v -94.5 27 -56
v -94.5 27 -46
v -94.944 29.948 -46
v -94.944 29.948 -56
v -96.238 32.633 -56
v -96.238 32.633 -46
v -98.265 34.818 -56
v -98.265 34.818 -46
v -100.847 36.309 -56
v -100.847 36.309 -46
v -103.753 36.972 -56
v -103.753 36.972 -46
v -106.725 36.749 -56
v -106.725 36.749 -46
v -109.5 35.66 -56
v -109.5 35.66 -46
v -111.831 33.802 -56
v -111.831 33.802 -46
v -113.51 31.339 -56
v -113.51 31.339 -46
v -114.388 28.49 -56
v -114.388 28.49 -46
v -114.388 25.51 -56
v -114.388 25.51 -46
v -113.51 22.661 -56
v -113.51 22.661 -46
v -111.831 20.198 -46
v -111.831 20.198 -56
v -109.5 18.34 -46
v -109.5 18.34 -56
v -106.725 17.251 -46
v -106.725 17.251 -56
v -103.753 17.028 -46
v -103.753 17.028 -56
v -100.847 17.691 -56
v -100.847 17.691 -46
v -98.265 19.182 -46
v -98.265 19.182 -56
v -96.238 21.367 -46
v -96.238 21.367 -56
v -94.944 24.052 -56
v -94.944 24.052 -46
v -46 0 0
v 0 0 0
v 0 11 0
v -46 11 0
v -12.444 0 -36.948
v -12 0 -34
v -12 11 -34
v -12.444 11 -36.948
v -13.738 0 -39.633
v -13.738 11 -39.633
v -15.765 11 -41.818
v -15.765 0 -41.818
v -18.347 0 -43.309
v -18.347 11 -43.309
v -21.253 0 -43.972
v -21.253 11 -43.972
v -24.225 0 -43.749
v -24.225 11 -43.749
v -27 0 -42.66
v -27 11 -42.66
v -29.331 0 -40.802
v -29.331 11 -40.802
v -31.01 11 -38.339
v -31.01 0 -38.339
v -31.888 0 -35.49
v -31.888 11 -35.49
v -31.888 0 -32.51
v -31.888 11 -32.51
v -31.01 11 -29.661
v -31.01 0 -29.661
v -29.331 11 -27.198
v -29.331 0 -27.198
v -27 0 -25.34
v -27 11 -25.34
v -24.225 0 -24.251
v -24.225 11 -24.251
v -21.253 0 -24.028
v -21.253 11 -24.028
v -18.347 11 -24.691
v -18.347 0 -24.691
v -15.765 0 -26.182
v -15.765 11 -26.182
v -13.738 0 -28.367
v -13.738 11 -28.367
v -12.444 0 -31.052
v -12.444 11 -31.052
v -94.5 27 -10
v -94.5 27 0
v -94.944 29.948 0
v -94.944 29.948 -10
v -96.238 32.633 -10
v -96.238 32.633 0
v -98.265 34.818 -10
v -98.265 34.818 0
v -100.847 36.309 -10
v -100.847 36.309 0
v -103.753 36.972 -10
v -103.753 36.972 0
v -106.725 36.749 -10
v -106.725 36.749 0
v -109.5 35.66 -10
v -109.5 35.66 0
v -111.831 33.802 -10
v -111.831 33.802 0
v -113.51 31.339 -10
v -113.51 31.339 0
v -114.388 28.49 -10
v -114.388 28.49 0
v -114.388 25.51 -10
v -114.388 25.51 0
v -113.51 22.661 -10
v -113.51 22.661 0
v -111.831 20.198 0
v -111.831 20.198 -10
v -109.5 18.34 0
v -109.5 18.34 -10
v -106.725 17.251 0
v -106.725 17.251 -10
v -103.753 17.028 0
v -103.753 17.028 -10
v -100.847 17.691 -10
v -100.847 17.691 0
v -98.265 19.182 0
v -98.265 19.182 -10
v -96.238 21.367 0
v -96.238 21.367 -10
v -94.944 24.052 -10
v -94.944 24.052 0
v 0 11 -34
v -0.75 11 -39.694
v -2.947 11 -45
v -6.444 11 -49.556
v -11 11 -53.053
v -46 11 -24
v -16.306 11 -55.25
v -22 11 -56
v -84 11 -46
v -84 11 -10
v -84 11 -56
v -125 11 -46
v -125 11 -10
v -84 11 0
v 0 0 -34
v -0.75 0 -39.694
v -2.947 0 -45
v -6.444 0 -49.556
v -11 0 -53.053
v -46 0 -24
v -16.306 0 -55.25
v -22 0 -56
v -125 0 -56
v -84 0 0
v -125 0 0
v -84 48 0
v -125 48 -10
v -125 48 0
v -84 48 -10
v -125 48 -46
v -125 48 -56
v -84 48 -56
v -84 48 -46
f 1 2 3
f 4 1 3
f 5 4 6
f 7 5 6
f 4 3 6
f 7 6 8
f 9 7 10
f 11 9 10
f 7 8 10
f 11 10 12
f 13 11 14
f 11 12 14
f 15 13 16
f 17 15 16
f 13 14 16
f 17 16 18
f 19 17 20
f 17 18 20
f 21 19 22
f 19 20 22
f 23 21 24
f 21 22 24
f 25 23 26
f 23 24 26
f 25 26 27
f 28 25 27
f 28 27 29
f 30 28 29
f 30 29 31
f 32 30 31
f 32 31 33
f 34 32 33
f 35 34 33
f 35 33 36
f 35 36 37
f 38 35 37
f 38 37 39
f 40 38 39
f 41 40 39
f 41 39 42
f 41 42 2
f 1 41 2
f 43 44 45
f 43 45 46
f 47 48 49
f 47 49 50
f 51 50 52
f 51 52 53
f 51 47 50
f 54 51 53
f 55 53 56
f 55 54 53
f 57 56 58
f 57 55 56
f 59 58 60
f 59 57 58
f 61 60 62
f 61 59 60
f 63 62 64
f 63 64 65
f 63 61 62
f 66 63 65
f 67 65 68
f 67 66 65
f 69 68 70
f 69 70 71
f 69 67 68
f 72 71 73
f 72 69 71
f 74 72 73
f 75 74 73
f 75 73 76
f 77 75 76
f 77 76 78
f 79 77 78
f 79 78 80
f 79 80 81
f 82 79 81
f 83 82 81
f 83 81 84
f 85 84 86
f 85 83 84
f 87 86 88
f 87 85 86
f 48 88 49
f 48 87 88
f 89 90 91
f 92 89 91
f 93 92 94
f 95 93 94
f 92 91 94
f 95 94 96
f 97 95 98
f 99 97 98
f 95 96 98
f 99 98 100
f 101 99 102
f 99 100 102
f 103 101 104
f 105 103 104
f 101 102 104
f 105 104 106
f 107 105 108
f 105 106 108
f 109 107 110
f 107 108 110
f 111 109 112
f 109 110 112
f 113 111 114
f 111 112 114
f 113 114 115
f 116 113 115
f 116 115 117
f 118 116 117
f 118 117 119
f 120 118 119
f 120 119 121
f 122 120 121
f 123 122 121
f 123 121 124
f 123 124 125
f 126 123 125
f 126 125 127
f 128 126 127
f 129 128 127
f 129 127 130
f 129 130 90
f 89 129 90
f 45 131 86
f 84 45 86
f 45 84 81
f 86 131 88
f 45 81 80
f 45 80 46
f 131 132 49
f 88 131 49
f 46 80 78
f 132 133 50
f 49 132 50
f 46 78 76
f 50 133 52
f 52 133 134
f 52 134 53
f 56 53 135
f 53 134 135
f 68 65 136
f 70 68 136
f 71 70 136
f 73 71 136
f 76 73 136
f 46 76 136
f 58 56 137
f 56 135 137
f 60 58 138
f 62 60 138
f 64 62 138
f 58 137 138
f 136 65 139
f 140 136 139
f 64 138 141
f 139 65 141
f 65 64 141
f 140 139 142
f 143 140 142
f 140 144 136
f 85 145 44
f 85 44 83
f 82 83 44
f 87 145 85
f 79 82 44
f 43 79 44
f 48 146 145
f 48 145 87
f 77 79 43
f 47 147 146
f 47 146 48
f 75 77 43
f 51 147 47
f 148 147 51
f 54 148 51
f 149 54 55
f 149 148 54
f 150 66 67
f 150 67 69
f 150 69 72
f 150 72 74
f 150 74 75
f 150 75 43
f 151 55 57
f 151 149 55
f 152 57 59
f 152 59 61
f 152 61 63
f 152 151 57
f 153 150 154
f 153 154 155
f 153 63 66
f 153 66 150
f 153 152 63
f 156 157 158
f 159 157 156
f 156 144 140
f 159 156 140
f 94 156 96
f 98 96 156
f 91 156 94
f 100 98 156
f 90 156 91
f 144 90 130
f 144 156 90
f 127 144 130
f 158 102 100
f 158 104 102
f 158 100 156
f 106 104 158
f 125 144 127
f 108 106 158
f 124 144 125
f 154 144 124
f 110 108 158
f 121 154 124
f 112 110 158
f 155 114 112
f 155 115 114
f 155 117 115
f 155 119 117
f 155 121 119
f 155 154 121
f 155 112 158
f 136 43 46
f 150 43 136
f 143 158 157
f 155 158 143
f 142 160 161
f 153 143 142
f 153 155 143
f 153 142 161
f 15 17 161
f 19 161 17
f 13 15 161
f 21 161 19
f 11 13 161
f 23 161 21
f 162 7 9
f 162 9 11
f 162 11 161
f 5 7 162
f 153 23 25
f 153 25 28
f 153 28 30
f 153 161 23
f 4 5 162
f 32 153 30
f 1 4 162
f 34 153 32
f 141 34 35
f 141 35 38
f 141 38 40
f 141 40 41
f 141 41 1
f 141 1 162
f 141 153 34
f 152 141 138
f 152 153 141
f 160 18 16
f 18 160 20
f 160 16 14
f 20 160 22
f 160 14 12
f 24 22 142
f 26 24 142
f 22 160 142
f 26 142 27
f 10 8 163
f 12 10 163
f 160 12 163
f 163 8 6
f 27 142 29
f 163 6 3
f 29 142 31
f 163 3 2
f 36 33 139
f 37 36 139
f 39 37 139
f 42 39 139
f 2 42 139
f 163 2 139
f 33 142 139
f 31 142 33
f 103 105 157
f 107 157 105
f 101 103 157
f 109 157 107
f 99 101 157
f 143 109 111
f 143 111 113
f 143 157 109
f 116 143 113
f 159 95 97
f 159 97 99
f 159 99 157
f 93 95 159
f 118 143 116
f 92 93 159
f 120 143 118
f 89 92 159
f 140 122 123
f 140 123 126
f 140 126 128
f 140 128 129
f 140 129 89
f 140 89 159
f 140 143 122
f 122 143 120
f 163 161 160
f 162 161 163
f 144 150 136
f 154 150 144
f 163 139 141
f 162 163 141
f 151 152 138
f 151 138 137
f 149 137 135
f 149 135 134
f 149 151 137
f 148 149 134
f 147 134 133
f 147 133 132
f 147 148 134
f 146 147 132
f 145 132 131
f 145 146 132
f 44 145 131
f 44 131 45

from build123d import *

# Parameters (mm, degrees)
SKETCH2_R               = 10
BOSS_EXTRUDE1_DEPTH     = 11
SKETCH5_W               = 41
SKETCH5_H               = 10
BOSS_EXTRUDE3_DEPTH     = 37
SKETCH6_R               = 10
CUT_EXTRUDE1_DEPTH      = 1
CUT_EXTRUDE1_DEPTH_BACK = 57


with BuildPart() as part:
    # Sketch2 → Boss-Extrude1 (new body)
    with BuildSketch(Plane(origin=(0, 0, 0), x_dir=(1, 0, 0), z_dir=(0, 1, 0))):
        with BuildLine():
            Line((-46, 0), (-46, 24))
            Line((-46, 24), (-84, 0))
            Line((-84, 0), (-125, 0))
            Line((-125, 0), (-125, 56))
            Line((-125, 56), (-22, 56))
            ThreePointArc((-22, 56), (-6.443650814, 49.556349186), (0, 34))
            Line((0, 34), (0, 0))
            Line((0, 0), (-46, 0))
        make_face()
        with Locations((-22, 34)):
            Circle(SKETCH2_R, mode=Mode.SUBTRACT)
    extrude(amount=BOSS_EXTRUDE1_DEPTH)

    # Sketch5 → Boss-Extrude3 (add)
    with BuildSketch(Plane(origin=(0, 11, 0), x_dir=(1, 0, 0), z_dir=(0, 1, 0))):
        with Locations((-104.5, 51)):
            Rectangle(SKETCH5_W, SKETCH5_H)
        with Locations((-104.5, 5)):
            Rectangle(SKETCH5_W, SKETCH5_H)
    extrude(amount=BOSS_EXTRUDE3_DEPTH)

    # Sketch6 → Cut-Extrude1 (cut, two sides)
    with BuildSketch(Plane.XY) as cut_extrude1_sk:
        with Locations((-104.5, 27)):
            Circle(SKETCH6_R)
    extrude(amount=CUT_EXTRUDE1_DEPTH, mode=Mode.SUBTRACT)
    extrude(cut_extrude1_sk.sketch, amount=-CUT_EXTRUDE1_DEPTH_BACK, mode=Mode.SUBTRACT)


solid = part.part
